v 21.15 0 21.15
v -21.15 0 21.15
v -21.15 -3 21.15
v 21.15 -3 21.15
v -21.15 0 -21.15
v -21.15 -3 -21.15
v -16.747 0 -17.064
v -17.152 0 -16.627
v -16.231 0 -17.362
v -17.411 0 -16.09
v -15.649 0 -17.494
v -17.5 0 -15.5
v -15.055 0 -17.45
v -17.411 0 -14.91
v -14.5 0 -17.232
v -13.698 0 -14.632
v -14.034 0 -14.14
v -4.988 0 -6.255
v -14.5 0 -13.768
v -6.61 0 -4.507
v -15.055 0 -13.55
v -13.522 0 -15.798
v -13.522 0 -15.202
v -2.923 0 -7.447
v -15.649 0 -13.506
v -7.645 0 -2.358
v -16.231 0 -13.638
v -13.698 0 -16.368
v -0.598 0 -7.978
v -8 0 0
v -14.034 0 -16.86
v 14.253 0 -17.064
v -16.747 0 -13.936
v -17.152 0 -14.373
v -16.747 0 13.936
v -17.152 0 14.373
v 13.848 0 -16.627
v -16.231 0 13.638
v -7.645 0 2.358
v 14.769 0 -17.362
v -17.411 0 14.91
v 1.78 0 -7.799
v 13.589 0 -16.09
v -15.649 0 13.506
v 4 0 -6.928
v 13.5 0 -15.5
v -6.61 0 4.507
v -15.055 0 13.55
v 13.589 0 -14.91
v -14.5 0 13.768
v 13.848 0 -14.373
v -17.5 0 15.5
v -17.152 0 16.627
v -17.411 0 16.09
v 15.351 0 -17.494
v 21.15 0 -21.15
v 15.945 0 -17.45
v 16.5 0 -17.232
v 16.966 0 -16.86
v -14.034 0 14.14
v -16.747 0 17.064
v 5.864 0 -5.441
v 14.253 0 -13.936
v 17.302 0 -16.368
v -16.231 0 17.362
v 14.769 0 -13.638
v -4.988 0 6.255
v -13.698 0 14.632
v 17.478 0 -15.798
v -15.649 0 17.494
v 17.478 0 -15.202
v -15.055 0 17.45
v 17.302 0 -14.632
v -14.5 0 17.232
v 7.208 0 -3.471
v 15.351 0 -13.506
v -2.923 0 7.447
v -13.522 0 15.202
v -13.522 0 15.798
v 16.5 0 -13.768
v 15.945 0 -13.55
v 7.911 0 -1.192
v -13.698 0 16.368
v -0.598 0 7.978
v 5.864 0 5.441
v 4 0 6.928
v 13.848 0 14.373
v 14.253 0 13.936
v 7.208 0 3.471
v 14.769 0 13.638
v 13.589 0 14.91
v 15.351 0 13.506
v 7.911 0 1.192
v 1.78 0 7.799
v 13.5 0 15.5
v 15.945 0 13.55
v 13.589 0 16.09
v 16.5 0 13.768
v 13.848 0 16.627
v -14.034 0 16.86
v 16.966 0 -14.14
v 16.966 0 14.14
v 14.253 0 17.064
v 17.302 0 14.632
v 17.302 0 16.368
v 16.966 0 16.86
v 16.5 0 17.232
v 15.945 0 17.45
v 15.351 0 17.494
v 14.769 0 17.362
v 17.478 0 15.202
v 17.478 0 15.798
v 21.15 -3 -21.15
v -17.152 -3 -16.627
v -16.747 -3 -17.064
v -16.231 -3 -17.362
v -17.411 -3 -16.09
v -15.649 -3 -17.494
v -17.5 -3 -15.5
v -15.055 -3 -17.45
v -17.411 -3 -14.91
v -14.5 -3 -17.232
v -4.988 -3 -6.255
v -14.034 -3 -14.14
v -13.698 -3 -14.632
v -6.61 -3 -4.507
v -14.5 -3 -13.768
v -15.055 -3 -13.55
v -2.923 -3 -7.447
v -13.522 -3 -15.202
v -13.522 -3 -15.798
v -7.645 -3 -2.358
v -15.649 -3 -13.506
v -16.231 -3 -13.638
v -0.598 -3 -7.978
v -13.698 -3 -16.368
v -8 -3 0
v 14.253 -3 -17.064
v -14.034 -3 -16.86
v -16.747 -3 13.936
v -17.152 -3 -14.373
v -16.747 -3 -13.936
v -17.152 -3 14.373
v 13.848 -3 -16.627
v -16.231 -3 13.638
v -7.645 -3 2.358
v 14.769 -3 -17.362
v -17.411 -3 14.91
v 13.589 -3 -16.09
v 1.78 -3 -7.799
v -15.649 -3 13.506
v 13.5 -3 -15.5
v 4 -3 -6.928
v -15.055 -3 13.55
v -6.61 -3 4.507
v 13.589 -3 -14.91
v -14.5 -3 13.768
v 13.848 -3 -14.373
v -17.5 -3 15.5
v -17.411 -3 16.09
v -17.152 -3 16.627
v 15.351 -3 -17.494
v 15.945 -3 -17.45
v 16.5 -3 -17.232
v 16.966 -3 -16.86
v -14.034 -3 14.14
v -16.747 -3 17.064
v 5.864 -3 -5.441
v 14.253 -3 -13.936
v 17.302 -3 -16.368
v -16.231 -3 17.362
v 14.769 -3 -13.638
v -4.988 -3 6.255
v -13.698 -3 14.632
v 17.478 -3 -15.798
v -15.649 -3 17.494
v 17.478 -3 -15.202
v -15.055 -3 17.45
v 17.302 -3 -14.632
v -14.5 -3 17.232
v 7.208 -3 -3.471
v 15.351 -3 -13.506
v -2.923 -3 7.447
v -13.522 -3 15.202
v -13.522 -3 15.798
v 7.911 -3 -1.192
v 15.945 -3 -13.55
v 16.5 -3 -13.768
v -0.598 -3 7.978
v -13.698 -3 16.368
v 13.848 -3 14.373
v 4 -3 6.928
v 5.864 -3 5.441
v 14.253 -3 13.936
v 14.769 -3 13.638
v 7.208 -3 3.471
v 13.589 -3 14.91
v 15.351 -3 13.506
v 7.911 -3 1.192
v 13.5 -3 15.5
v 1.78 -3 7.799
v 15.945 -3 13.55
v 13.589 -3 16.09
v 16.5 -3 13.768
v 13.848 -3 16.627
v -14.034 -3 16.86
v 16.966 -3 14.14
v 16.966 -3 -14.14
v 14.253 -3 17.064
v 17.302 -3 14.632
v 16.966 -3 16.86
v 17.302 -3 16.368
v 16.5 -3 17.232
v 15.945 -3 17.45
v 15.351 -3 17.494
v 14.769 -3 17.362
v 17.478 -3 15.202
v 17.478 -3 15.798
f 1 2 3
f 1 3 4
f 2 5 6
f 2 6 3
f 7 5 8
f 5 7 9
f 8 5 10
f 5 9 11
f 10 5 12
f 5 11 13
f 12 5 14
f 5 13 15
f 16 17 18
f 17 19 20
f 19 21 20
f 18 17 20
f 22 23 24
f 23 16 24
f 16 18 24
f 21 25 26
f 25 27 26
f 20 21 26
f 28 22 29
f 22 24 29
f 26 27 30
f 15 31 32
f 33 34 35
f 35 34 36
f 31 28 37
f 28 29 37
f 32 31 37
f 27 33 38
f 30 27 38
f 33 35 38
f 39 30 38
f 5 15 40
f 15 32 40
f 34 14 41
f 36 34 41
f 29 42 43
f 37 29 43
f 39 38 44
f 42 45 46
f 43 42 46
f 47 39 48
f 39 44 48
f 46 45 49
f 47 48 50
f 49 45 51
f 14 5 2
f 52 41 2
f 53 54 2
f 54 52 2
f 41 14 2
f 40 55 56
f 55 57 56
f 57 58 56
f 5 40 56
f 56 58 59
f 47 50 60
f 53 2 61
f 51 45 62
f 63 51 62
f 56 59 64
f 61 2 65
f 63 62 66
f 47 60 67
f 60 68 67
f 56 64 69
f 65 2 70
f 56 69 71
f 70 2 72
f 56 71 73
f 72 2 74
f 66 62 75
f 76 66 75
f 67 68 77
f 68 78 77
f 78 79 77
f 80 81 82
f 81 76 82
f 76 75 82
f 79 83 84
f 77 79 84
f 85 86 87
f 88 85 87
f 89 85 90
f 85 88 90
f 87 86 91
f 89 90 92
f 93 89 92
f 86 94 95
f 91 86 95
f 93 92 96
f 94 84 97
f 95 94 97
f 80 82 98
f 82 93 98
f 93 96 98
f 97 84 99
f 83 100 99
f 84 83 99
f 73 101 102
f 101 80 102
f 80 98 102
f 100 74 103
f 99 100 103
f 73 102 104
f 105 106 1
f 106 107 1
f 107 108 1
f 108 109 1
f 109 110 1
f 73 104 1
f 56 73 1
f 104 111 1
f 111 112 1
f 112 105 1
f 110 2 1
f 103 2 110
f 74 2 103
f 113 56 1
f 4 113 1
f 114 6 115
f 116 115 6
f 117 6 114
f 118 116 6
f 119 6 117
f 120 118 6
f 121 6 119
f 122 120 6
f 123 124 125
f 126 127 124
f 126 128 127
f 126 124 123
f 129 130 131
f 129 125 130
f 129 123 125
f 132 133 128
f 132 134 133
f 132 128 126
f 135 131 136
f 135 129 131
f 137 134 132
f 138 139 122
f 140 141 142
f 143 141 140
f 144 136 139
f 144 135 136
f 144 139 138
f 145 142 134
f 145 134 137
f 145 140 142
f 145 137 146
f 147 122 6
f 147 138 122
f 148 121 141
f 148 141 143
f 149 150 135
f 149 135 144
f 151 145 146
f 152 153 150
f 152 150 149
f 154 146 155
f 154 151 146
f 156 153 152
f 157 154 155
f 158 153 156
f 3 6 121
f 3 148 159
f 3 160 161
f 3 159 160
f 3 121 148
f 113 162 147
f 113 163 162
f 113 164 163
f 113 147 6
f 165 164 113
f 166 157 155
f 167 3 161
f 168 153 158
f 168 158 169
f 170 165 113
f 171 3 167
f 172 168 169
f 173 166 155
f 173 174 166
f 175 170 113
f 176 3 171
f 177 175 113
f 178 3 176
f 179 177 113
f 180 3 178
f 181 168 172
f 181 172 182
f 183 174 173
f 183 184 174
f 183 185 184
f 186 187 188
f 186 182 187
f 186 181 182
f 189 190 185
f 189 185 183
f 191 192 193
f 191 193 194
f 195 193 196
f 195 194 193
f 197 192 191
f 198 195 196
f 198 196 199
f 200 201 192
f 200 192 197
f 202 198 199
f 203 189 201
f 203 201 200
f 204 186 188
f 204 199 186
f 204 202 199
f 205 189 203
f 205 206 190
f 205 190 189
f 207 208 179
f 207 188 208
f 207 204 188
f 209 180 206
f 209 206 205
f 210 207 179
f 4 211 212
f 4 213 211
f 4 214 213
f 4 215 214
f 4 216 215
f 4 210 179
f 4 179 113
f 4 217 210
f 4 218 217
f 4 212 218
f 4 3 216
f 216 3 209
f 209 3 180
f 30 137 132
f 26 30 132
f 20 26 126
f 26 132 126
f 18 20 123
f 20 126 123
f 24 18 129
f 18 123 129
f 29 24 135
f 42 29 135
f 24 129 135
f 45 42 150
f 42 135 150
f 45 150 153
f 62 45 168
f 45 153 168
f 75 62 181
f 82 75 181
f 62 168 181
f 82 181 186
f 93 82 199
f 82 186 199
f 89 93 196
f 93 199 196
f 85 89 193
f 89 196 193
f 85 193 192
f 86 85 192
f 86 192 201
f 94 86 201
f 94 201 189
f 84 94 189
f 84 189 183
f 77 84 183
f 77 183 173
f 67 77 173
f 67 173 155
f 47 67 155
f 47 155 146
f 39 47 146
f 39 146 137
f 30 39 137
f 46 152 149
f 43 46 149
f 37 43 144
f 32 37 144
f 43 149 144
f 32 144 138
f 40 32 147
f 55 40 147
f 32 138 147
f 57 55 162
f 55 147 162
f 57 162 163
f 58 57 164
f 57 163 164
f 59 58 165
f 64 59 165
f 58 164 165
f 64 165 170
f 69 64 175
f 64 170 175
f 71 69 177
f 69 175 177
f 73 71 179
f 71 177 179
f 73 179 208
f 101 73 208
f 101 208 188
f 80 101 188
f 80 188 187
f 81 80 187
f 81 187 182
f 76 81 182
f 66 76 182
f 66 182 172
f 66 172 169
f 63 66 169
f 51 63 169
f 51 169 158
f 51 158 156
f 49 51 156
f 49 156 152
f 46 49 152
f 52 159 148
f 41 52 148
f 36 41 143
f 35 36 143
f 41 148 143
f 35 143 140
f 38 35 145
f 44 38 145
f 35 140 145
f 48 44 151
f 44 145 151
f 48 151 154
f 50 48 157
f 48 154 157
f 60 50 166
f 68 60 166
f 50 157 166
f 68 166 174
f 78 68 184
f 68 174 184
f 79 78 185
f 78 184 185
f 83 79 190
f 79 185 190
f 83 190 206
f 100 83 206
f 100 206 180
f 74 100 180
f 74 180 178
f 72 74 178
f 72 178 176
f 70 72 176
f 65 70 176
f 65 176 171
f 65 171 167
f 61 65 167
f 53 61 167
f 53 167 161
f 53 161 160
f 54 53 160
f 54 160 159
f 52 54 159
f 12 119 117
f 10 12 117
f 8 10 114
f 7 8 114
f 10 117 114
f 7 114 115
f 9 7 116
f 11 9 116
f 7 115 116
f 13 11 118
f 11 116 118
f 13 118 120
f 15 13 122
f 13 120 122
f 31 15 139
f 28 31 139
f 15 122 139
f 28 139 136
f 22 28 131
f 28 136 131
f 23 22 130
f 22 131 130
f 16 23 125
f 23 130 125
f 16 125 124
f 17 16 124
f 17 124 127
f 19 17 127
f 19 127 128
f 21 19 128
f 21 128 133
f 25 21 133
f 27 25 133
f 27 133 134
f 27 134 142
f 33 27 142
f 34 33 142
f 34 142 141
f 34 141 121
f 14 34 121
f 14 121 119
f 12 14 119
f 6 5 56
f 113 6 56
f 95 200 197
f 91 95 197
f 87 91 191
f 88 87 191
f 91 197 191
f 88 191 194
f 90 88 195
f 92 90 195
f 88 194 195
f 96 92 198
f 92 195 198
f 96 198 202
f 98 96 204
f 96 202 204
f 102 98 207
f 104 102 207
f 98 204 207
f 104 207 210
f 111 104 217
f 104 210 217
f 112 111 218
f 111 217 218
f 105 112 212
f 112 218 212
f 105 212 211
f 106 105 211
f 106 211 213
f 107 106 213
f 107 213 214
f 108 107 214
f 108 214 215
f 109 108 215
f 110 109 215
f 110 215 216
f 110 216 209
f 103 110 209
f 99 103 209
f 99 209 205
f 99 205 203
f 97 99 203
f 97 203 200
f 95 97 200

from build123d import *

# Parameters (mm, degrees)
F0_W     = 42.3
F0_H     = 42.3
F1_DEPTH = 3
F2_D     = 4
F3_D     = 16


with BuildPart() as f1:
    # F0 (on Front) → F1 (new body)
    with BuildSketch(Plane.XZ):
        Rectangle(F0_W, F0_H)
    extrude(amount=F1_DEPTH)

    # F2 (through all)
    with Locations(Plane(origin=(0, 0, 0), x_dir=(1, 0, 0), z_dir=(0, 1, 0))):
        with Locations((-15.5, 15.5), (15.5, 15.5), (15.5, -15.5), (-15.5, -15.5)):
            Hole(F2_D / 2)

    # F3 (through all)
    with Locations(Plane(origin=(0, 0, 0), x_dir=(1, 0, 0), z_dir=(0, 1, 0))):
        with Locations((0, 0)):
            Hole(F3_D / 2)


solid = f1.part
